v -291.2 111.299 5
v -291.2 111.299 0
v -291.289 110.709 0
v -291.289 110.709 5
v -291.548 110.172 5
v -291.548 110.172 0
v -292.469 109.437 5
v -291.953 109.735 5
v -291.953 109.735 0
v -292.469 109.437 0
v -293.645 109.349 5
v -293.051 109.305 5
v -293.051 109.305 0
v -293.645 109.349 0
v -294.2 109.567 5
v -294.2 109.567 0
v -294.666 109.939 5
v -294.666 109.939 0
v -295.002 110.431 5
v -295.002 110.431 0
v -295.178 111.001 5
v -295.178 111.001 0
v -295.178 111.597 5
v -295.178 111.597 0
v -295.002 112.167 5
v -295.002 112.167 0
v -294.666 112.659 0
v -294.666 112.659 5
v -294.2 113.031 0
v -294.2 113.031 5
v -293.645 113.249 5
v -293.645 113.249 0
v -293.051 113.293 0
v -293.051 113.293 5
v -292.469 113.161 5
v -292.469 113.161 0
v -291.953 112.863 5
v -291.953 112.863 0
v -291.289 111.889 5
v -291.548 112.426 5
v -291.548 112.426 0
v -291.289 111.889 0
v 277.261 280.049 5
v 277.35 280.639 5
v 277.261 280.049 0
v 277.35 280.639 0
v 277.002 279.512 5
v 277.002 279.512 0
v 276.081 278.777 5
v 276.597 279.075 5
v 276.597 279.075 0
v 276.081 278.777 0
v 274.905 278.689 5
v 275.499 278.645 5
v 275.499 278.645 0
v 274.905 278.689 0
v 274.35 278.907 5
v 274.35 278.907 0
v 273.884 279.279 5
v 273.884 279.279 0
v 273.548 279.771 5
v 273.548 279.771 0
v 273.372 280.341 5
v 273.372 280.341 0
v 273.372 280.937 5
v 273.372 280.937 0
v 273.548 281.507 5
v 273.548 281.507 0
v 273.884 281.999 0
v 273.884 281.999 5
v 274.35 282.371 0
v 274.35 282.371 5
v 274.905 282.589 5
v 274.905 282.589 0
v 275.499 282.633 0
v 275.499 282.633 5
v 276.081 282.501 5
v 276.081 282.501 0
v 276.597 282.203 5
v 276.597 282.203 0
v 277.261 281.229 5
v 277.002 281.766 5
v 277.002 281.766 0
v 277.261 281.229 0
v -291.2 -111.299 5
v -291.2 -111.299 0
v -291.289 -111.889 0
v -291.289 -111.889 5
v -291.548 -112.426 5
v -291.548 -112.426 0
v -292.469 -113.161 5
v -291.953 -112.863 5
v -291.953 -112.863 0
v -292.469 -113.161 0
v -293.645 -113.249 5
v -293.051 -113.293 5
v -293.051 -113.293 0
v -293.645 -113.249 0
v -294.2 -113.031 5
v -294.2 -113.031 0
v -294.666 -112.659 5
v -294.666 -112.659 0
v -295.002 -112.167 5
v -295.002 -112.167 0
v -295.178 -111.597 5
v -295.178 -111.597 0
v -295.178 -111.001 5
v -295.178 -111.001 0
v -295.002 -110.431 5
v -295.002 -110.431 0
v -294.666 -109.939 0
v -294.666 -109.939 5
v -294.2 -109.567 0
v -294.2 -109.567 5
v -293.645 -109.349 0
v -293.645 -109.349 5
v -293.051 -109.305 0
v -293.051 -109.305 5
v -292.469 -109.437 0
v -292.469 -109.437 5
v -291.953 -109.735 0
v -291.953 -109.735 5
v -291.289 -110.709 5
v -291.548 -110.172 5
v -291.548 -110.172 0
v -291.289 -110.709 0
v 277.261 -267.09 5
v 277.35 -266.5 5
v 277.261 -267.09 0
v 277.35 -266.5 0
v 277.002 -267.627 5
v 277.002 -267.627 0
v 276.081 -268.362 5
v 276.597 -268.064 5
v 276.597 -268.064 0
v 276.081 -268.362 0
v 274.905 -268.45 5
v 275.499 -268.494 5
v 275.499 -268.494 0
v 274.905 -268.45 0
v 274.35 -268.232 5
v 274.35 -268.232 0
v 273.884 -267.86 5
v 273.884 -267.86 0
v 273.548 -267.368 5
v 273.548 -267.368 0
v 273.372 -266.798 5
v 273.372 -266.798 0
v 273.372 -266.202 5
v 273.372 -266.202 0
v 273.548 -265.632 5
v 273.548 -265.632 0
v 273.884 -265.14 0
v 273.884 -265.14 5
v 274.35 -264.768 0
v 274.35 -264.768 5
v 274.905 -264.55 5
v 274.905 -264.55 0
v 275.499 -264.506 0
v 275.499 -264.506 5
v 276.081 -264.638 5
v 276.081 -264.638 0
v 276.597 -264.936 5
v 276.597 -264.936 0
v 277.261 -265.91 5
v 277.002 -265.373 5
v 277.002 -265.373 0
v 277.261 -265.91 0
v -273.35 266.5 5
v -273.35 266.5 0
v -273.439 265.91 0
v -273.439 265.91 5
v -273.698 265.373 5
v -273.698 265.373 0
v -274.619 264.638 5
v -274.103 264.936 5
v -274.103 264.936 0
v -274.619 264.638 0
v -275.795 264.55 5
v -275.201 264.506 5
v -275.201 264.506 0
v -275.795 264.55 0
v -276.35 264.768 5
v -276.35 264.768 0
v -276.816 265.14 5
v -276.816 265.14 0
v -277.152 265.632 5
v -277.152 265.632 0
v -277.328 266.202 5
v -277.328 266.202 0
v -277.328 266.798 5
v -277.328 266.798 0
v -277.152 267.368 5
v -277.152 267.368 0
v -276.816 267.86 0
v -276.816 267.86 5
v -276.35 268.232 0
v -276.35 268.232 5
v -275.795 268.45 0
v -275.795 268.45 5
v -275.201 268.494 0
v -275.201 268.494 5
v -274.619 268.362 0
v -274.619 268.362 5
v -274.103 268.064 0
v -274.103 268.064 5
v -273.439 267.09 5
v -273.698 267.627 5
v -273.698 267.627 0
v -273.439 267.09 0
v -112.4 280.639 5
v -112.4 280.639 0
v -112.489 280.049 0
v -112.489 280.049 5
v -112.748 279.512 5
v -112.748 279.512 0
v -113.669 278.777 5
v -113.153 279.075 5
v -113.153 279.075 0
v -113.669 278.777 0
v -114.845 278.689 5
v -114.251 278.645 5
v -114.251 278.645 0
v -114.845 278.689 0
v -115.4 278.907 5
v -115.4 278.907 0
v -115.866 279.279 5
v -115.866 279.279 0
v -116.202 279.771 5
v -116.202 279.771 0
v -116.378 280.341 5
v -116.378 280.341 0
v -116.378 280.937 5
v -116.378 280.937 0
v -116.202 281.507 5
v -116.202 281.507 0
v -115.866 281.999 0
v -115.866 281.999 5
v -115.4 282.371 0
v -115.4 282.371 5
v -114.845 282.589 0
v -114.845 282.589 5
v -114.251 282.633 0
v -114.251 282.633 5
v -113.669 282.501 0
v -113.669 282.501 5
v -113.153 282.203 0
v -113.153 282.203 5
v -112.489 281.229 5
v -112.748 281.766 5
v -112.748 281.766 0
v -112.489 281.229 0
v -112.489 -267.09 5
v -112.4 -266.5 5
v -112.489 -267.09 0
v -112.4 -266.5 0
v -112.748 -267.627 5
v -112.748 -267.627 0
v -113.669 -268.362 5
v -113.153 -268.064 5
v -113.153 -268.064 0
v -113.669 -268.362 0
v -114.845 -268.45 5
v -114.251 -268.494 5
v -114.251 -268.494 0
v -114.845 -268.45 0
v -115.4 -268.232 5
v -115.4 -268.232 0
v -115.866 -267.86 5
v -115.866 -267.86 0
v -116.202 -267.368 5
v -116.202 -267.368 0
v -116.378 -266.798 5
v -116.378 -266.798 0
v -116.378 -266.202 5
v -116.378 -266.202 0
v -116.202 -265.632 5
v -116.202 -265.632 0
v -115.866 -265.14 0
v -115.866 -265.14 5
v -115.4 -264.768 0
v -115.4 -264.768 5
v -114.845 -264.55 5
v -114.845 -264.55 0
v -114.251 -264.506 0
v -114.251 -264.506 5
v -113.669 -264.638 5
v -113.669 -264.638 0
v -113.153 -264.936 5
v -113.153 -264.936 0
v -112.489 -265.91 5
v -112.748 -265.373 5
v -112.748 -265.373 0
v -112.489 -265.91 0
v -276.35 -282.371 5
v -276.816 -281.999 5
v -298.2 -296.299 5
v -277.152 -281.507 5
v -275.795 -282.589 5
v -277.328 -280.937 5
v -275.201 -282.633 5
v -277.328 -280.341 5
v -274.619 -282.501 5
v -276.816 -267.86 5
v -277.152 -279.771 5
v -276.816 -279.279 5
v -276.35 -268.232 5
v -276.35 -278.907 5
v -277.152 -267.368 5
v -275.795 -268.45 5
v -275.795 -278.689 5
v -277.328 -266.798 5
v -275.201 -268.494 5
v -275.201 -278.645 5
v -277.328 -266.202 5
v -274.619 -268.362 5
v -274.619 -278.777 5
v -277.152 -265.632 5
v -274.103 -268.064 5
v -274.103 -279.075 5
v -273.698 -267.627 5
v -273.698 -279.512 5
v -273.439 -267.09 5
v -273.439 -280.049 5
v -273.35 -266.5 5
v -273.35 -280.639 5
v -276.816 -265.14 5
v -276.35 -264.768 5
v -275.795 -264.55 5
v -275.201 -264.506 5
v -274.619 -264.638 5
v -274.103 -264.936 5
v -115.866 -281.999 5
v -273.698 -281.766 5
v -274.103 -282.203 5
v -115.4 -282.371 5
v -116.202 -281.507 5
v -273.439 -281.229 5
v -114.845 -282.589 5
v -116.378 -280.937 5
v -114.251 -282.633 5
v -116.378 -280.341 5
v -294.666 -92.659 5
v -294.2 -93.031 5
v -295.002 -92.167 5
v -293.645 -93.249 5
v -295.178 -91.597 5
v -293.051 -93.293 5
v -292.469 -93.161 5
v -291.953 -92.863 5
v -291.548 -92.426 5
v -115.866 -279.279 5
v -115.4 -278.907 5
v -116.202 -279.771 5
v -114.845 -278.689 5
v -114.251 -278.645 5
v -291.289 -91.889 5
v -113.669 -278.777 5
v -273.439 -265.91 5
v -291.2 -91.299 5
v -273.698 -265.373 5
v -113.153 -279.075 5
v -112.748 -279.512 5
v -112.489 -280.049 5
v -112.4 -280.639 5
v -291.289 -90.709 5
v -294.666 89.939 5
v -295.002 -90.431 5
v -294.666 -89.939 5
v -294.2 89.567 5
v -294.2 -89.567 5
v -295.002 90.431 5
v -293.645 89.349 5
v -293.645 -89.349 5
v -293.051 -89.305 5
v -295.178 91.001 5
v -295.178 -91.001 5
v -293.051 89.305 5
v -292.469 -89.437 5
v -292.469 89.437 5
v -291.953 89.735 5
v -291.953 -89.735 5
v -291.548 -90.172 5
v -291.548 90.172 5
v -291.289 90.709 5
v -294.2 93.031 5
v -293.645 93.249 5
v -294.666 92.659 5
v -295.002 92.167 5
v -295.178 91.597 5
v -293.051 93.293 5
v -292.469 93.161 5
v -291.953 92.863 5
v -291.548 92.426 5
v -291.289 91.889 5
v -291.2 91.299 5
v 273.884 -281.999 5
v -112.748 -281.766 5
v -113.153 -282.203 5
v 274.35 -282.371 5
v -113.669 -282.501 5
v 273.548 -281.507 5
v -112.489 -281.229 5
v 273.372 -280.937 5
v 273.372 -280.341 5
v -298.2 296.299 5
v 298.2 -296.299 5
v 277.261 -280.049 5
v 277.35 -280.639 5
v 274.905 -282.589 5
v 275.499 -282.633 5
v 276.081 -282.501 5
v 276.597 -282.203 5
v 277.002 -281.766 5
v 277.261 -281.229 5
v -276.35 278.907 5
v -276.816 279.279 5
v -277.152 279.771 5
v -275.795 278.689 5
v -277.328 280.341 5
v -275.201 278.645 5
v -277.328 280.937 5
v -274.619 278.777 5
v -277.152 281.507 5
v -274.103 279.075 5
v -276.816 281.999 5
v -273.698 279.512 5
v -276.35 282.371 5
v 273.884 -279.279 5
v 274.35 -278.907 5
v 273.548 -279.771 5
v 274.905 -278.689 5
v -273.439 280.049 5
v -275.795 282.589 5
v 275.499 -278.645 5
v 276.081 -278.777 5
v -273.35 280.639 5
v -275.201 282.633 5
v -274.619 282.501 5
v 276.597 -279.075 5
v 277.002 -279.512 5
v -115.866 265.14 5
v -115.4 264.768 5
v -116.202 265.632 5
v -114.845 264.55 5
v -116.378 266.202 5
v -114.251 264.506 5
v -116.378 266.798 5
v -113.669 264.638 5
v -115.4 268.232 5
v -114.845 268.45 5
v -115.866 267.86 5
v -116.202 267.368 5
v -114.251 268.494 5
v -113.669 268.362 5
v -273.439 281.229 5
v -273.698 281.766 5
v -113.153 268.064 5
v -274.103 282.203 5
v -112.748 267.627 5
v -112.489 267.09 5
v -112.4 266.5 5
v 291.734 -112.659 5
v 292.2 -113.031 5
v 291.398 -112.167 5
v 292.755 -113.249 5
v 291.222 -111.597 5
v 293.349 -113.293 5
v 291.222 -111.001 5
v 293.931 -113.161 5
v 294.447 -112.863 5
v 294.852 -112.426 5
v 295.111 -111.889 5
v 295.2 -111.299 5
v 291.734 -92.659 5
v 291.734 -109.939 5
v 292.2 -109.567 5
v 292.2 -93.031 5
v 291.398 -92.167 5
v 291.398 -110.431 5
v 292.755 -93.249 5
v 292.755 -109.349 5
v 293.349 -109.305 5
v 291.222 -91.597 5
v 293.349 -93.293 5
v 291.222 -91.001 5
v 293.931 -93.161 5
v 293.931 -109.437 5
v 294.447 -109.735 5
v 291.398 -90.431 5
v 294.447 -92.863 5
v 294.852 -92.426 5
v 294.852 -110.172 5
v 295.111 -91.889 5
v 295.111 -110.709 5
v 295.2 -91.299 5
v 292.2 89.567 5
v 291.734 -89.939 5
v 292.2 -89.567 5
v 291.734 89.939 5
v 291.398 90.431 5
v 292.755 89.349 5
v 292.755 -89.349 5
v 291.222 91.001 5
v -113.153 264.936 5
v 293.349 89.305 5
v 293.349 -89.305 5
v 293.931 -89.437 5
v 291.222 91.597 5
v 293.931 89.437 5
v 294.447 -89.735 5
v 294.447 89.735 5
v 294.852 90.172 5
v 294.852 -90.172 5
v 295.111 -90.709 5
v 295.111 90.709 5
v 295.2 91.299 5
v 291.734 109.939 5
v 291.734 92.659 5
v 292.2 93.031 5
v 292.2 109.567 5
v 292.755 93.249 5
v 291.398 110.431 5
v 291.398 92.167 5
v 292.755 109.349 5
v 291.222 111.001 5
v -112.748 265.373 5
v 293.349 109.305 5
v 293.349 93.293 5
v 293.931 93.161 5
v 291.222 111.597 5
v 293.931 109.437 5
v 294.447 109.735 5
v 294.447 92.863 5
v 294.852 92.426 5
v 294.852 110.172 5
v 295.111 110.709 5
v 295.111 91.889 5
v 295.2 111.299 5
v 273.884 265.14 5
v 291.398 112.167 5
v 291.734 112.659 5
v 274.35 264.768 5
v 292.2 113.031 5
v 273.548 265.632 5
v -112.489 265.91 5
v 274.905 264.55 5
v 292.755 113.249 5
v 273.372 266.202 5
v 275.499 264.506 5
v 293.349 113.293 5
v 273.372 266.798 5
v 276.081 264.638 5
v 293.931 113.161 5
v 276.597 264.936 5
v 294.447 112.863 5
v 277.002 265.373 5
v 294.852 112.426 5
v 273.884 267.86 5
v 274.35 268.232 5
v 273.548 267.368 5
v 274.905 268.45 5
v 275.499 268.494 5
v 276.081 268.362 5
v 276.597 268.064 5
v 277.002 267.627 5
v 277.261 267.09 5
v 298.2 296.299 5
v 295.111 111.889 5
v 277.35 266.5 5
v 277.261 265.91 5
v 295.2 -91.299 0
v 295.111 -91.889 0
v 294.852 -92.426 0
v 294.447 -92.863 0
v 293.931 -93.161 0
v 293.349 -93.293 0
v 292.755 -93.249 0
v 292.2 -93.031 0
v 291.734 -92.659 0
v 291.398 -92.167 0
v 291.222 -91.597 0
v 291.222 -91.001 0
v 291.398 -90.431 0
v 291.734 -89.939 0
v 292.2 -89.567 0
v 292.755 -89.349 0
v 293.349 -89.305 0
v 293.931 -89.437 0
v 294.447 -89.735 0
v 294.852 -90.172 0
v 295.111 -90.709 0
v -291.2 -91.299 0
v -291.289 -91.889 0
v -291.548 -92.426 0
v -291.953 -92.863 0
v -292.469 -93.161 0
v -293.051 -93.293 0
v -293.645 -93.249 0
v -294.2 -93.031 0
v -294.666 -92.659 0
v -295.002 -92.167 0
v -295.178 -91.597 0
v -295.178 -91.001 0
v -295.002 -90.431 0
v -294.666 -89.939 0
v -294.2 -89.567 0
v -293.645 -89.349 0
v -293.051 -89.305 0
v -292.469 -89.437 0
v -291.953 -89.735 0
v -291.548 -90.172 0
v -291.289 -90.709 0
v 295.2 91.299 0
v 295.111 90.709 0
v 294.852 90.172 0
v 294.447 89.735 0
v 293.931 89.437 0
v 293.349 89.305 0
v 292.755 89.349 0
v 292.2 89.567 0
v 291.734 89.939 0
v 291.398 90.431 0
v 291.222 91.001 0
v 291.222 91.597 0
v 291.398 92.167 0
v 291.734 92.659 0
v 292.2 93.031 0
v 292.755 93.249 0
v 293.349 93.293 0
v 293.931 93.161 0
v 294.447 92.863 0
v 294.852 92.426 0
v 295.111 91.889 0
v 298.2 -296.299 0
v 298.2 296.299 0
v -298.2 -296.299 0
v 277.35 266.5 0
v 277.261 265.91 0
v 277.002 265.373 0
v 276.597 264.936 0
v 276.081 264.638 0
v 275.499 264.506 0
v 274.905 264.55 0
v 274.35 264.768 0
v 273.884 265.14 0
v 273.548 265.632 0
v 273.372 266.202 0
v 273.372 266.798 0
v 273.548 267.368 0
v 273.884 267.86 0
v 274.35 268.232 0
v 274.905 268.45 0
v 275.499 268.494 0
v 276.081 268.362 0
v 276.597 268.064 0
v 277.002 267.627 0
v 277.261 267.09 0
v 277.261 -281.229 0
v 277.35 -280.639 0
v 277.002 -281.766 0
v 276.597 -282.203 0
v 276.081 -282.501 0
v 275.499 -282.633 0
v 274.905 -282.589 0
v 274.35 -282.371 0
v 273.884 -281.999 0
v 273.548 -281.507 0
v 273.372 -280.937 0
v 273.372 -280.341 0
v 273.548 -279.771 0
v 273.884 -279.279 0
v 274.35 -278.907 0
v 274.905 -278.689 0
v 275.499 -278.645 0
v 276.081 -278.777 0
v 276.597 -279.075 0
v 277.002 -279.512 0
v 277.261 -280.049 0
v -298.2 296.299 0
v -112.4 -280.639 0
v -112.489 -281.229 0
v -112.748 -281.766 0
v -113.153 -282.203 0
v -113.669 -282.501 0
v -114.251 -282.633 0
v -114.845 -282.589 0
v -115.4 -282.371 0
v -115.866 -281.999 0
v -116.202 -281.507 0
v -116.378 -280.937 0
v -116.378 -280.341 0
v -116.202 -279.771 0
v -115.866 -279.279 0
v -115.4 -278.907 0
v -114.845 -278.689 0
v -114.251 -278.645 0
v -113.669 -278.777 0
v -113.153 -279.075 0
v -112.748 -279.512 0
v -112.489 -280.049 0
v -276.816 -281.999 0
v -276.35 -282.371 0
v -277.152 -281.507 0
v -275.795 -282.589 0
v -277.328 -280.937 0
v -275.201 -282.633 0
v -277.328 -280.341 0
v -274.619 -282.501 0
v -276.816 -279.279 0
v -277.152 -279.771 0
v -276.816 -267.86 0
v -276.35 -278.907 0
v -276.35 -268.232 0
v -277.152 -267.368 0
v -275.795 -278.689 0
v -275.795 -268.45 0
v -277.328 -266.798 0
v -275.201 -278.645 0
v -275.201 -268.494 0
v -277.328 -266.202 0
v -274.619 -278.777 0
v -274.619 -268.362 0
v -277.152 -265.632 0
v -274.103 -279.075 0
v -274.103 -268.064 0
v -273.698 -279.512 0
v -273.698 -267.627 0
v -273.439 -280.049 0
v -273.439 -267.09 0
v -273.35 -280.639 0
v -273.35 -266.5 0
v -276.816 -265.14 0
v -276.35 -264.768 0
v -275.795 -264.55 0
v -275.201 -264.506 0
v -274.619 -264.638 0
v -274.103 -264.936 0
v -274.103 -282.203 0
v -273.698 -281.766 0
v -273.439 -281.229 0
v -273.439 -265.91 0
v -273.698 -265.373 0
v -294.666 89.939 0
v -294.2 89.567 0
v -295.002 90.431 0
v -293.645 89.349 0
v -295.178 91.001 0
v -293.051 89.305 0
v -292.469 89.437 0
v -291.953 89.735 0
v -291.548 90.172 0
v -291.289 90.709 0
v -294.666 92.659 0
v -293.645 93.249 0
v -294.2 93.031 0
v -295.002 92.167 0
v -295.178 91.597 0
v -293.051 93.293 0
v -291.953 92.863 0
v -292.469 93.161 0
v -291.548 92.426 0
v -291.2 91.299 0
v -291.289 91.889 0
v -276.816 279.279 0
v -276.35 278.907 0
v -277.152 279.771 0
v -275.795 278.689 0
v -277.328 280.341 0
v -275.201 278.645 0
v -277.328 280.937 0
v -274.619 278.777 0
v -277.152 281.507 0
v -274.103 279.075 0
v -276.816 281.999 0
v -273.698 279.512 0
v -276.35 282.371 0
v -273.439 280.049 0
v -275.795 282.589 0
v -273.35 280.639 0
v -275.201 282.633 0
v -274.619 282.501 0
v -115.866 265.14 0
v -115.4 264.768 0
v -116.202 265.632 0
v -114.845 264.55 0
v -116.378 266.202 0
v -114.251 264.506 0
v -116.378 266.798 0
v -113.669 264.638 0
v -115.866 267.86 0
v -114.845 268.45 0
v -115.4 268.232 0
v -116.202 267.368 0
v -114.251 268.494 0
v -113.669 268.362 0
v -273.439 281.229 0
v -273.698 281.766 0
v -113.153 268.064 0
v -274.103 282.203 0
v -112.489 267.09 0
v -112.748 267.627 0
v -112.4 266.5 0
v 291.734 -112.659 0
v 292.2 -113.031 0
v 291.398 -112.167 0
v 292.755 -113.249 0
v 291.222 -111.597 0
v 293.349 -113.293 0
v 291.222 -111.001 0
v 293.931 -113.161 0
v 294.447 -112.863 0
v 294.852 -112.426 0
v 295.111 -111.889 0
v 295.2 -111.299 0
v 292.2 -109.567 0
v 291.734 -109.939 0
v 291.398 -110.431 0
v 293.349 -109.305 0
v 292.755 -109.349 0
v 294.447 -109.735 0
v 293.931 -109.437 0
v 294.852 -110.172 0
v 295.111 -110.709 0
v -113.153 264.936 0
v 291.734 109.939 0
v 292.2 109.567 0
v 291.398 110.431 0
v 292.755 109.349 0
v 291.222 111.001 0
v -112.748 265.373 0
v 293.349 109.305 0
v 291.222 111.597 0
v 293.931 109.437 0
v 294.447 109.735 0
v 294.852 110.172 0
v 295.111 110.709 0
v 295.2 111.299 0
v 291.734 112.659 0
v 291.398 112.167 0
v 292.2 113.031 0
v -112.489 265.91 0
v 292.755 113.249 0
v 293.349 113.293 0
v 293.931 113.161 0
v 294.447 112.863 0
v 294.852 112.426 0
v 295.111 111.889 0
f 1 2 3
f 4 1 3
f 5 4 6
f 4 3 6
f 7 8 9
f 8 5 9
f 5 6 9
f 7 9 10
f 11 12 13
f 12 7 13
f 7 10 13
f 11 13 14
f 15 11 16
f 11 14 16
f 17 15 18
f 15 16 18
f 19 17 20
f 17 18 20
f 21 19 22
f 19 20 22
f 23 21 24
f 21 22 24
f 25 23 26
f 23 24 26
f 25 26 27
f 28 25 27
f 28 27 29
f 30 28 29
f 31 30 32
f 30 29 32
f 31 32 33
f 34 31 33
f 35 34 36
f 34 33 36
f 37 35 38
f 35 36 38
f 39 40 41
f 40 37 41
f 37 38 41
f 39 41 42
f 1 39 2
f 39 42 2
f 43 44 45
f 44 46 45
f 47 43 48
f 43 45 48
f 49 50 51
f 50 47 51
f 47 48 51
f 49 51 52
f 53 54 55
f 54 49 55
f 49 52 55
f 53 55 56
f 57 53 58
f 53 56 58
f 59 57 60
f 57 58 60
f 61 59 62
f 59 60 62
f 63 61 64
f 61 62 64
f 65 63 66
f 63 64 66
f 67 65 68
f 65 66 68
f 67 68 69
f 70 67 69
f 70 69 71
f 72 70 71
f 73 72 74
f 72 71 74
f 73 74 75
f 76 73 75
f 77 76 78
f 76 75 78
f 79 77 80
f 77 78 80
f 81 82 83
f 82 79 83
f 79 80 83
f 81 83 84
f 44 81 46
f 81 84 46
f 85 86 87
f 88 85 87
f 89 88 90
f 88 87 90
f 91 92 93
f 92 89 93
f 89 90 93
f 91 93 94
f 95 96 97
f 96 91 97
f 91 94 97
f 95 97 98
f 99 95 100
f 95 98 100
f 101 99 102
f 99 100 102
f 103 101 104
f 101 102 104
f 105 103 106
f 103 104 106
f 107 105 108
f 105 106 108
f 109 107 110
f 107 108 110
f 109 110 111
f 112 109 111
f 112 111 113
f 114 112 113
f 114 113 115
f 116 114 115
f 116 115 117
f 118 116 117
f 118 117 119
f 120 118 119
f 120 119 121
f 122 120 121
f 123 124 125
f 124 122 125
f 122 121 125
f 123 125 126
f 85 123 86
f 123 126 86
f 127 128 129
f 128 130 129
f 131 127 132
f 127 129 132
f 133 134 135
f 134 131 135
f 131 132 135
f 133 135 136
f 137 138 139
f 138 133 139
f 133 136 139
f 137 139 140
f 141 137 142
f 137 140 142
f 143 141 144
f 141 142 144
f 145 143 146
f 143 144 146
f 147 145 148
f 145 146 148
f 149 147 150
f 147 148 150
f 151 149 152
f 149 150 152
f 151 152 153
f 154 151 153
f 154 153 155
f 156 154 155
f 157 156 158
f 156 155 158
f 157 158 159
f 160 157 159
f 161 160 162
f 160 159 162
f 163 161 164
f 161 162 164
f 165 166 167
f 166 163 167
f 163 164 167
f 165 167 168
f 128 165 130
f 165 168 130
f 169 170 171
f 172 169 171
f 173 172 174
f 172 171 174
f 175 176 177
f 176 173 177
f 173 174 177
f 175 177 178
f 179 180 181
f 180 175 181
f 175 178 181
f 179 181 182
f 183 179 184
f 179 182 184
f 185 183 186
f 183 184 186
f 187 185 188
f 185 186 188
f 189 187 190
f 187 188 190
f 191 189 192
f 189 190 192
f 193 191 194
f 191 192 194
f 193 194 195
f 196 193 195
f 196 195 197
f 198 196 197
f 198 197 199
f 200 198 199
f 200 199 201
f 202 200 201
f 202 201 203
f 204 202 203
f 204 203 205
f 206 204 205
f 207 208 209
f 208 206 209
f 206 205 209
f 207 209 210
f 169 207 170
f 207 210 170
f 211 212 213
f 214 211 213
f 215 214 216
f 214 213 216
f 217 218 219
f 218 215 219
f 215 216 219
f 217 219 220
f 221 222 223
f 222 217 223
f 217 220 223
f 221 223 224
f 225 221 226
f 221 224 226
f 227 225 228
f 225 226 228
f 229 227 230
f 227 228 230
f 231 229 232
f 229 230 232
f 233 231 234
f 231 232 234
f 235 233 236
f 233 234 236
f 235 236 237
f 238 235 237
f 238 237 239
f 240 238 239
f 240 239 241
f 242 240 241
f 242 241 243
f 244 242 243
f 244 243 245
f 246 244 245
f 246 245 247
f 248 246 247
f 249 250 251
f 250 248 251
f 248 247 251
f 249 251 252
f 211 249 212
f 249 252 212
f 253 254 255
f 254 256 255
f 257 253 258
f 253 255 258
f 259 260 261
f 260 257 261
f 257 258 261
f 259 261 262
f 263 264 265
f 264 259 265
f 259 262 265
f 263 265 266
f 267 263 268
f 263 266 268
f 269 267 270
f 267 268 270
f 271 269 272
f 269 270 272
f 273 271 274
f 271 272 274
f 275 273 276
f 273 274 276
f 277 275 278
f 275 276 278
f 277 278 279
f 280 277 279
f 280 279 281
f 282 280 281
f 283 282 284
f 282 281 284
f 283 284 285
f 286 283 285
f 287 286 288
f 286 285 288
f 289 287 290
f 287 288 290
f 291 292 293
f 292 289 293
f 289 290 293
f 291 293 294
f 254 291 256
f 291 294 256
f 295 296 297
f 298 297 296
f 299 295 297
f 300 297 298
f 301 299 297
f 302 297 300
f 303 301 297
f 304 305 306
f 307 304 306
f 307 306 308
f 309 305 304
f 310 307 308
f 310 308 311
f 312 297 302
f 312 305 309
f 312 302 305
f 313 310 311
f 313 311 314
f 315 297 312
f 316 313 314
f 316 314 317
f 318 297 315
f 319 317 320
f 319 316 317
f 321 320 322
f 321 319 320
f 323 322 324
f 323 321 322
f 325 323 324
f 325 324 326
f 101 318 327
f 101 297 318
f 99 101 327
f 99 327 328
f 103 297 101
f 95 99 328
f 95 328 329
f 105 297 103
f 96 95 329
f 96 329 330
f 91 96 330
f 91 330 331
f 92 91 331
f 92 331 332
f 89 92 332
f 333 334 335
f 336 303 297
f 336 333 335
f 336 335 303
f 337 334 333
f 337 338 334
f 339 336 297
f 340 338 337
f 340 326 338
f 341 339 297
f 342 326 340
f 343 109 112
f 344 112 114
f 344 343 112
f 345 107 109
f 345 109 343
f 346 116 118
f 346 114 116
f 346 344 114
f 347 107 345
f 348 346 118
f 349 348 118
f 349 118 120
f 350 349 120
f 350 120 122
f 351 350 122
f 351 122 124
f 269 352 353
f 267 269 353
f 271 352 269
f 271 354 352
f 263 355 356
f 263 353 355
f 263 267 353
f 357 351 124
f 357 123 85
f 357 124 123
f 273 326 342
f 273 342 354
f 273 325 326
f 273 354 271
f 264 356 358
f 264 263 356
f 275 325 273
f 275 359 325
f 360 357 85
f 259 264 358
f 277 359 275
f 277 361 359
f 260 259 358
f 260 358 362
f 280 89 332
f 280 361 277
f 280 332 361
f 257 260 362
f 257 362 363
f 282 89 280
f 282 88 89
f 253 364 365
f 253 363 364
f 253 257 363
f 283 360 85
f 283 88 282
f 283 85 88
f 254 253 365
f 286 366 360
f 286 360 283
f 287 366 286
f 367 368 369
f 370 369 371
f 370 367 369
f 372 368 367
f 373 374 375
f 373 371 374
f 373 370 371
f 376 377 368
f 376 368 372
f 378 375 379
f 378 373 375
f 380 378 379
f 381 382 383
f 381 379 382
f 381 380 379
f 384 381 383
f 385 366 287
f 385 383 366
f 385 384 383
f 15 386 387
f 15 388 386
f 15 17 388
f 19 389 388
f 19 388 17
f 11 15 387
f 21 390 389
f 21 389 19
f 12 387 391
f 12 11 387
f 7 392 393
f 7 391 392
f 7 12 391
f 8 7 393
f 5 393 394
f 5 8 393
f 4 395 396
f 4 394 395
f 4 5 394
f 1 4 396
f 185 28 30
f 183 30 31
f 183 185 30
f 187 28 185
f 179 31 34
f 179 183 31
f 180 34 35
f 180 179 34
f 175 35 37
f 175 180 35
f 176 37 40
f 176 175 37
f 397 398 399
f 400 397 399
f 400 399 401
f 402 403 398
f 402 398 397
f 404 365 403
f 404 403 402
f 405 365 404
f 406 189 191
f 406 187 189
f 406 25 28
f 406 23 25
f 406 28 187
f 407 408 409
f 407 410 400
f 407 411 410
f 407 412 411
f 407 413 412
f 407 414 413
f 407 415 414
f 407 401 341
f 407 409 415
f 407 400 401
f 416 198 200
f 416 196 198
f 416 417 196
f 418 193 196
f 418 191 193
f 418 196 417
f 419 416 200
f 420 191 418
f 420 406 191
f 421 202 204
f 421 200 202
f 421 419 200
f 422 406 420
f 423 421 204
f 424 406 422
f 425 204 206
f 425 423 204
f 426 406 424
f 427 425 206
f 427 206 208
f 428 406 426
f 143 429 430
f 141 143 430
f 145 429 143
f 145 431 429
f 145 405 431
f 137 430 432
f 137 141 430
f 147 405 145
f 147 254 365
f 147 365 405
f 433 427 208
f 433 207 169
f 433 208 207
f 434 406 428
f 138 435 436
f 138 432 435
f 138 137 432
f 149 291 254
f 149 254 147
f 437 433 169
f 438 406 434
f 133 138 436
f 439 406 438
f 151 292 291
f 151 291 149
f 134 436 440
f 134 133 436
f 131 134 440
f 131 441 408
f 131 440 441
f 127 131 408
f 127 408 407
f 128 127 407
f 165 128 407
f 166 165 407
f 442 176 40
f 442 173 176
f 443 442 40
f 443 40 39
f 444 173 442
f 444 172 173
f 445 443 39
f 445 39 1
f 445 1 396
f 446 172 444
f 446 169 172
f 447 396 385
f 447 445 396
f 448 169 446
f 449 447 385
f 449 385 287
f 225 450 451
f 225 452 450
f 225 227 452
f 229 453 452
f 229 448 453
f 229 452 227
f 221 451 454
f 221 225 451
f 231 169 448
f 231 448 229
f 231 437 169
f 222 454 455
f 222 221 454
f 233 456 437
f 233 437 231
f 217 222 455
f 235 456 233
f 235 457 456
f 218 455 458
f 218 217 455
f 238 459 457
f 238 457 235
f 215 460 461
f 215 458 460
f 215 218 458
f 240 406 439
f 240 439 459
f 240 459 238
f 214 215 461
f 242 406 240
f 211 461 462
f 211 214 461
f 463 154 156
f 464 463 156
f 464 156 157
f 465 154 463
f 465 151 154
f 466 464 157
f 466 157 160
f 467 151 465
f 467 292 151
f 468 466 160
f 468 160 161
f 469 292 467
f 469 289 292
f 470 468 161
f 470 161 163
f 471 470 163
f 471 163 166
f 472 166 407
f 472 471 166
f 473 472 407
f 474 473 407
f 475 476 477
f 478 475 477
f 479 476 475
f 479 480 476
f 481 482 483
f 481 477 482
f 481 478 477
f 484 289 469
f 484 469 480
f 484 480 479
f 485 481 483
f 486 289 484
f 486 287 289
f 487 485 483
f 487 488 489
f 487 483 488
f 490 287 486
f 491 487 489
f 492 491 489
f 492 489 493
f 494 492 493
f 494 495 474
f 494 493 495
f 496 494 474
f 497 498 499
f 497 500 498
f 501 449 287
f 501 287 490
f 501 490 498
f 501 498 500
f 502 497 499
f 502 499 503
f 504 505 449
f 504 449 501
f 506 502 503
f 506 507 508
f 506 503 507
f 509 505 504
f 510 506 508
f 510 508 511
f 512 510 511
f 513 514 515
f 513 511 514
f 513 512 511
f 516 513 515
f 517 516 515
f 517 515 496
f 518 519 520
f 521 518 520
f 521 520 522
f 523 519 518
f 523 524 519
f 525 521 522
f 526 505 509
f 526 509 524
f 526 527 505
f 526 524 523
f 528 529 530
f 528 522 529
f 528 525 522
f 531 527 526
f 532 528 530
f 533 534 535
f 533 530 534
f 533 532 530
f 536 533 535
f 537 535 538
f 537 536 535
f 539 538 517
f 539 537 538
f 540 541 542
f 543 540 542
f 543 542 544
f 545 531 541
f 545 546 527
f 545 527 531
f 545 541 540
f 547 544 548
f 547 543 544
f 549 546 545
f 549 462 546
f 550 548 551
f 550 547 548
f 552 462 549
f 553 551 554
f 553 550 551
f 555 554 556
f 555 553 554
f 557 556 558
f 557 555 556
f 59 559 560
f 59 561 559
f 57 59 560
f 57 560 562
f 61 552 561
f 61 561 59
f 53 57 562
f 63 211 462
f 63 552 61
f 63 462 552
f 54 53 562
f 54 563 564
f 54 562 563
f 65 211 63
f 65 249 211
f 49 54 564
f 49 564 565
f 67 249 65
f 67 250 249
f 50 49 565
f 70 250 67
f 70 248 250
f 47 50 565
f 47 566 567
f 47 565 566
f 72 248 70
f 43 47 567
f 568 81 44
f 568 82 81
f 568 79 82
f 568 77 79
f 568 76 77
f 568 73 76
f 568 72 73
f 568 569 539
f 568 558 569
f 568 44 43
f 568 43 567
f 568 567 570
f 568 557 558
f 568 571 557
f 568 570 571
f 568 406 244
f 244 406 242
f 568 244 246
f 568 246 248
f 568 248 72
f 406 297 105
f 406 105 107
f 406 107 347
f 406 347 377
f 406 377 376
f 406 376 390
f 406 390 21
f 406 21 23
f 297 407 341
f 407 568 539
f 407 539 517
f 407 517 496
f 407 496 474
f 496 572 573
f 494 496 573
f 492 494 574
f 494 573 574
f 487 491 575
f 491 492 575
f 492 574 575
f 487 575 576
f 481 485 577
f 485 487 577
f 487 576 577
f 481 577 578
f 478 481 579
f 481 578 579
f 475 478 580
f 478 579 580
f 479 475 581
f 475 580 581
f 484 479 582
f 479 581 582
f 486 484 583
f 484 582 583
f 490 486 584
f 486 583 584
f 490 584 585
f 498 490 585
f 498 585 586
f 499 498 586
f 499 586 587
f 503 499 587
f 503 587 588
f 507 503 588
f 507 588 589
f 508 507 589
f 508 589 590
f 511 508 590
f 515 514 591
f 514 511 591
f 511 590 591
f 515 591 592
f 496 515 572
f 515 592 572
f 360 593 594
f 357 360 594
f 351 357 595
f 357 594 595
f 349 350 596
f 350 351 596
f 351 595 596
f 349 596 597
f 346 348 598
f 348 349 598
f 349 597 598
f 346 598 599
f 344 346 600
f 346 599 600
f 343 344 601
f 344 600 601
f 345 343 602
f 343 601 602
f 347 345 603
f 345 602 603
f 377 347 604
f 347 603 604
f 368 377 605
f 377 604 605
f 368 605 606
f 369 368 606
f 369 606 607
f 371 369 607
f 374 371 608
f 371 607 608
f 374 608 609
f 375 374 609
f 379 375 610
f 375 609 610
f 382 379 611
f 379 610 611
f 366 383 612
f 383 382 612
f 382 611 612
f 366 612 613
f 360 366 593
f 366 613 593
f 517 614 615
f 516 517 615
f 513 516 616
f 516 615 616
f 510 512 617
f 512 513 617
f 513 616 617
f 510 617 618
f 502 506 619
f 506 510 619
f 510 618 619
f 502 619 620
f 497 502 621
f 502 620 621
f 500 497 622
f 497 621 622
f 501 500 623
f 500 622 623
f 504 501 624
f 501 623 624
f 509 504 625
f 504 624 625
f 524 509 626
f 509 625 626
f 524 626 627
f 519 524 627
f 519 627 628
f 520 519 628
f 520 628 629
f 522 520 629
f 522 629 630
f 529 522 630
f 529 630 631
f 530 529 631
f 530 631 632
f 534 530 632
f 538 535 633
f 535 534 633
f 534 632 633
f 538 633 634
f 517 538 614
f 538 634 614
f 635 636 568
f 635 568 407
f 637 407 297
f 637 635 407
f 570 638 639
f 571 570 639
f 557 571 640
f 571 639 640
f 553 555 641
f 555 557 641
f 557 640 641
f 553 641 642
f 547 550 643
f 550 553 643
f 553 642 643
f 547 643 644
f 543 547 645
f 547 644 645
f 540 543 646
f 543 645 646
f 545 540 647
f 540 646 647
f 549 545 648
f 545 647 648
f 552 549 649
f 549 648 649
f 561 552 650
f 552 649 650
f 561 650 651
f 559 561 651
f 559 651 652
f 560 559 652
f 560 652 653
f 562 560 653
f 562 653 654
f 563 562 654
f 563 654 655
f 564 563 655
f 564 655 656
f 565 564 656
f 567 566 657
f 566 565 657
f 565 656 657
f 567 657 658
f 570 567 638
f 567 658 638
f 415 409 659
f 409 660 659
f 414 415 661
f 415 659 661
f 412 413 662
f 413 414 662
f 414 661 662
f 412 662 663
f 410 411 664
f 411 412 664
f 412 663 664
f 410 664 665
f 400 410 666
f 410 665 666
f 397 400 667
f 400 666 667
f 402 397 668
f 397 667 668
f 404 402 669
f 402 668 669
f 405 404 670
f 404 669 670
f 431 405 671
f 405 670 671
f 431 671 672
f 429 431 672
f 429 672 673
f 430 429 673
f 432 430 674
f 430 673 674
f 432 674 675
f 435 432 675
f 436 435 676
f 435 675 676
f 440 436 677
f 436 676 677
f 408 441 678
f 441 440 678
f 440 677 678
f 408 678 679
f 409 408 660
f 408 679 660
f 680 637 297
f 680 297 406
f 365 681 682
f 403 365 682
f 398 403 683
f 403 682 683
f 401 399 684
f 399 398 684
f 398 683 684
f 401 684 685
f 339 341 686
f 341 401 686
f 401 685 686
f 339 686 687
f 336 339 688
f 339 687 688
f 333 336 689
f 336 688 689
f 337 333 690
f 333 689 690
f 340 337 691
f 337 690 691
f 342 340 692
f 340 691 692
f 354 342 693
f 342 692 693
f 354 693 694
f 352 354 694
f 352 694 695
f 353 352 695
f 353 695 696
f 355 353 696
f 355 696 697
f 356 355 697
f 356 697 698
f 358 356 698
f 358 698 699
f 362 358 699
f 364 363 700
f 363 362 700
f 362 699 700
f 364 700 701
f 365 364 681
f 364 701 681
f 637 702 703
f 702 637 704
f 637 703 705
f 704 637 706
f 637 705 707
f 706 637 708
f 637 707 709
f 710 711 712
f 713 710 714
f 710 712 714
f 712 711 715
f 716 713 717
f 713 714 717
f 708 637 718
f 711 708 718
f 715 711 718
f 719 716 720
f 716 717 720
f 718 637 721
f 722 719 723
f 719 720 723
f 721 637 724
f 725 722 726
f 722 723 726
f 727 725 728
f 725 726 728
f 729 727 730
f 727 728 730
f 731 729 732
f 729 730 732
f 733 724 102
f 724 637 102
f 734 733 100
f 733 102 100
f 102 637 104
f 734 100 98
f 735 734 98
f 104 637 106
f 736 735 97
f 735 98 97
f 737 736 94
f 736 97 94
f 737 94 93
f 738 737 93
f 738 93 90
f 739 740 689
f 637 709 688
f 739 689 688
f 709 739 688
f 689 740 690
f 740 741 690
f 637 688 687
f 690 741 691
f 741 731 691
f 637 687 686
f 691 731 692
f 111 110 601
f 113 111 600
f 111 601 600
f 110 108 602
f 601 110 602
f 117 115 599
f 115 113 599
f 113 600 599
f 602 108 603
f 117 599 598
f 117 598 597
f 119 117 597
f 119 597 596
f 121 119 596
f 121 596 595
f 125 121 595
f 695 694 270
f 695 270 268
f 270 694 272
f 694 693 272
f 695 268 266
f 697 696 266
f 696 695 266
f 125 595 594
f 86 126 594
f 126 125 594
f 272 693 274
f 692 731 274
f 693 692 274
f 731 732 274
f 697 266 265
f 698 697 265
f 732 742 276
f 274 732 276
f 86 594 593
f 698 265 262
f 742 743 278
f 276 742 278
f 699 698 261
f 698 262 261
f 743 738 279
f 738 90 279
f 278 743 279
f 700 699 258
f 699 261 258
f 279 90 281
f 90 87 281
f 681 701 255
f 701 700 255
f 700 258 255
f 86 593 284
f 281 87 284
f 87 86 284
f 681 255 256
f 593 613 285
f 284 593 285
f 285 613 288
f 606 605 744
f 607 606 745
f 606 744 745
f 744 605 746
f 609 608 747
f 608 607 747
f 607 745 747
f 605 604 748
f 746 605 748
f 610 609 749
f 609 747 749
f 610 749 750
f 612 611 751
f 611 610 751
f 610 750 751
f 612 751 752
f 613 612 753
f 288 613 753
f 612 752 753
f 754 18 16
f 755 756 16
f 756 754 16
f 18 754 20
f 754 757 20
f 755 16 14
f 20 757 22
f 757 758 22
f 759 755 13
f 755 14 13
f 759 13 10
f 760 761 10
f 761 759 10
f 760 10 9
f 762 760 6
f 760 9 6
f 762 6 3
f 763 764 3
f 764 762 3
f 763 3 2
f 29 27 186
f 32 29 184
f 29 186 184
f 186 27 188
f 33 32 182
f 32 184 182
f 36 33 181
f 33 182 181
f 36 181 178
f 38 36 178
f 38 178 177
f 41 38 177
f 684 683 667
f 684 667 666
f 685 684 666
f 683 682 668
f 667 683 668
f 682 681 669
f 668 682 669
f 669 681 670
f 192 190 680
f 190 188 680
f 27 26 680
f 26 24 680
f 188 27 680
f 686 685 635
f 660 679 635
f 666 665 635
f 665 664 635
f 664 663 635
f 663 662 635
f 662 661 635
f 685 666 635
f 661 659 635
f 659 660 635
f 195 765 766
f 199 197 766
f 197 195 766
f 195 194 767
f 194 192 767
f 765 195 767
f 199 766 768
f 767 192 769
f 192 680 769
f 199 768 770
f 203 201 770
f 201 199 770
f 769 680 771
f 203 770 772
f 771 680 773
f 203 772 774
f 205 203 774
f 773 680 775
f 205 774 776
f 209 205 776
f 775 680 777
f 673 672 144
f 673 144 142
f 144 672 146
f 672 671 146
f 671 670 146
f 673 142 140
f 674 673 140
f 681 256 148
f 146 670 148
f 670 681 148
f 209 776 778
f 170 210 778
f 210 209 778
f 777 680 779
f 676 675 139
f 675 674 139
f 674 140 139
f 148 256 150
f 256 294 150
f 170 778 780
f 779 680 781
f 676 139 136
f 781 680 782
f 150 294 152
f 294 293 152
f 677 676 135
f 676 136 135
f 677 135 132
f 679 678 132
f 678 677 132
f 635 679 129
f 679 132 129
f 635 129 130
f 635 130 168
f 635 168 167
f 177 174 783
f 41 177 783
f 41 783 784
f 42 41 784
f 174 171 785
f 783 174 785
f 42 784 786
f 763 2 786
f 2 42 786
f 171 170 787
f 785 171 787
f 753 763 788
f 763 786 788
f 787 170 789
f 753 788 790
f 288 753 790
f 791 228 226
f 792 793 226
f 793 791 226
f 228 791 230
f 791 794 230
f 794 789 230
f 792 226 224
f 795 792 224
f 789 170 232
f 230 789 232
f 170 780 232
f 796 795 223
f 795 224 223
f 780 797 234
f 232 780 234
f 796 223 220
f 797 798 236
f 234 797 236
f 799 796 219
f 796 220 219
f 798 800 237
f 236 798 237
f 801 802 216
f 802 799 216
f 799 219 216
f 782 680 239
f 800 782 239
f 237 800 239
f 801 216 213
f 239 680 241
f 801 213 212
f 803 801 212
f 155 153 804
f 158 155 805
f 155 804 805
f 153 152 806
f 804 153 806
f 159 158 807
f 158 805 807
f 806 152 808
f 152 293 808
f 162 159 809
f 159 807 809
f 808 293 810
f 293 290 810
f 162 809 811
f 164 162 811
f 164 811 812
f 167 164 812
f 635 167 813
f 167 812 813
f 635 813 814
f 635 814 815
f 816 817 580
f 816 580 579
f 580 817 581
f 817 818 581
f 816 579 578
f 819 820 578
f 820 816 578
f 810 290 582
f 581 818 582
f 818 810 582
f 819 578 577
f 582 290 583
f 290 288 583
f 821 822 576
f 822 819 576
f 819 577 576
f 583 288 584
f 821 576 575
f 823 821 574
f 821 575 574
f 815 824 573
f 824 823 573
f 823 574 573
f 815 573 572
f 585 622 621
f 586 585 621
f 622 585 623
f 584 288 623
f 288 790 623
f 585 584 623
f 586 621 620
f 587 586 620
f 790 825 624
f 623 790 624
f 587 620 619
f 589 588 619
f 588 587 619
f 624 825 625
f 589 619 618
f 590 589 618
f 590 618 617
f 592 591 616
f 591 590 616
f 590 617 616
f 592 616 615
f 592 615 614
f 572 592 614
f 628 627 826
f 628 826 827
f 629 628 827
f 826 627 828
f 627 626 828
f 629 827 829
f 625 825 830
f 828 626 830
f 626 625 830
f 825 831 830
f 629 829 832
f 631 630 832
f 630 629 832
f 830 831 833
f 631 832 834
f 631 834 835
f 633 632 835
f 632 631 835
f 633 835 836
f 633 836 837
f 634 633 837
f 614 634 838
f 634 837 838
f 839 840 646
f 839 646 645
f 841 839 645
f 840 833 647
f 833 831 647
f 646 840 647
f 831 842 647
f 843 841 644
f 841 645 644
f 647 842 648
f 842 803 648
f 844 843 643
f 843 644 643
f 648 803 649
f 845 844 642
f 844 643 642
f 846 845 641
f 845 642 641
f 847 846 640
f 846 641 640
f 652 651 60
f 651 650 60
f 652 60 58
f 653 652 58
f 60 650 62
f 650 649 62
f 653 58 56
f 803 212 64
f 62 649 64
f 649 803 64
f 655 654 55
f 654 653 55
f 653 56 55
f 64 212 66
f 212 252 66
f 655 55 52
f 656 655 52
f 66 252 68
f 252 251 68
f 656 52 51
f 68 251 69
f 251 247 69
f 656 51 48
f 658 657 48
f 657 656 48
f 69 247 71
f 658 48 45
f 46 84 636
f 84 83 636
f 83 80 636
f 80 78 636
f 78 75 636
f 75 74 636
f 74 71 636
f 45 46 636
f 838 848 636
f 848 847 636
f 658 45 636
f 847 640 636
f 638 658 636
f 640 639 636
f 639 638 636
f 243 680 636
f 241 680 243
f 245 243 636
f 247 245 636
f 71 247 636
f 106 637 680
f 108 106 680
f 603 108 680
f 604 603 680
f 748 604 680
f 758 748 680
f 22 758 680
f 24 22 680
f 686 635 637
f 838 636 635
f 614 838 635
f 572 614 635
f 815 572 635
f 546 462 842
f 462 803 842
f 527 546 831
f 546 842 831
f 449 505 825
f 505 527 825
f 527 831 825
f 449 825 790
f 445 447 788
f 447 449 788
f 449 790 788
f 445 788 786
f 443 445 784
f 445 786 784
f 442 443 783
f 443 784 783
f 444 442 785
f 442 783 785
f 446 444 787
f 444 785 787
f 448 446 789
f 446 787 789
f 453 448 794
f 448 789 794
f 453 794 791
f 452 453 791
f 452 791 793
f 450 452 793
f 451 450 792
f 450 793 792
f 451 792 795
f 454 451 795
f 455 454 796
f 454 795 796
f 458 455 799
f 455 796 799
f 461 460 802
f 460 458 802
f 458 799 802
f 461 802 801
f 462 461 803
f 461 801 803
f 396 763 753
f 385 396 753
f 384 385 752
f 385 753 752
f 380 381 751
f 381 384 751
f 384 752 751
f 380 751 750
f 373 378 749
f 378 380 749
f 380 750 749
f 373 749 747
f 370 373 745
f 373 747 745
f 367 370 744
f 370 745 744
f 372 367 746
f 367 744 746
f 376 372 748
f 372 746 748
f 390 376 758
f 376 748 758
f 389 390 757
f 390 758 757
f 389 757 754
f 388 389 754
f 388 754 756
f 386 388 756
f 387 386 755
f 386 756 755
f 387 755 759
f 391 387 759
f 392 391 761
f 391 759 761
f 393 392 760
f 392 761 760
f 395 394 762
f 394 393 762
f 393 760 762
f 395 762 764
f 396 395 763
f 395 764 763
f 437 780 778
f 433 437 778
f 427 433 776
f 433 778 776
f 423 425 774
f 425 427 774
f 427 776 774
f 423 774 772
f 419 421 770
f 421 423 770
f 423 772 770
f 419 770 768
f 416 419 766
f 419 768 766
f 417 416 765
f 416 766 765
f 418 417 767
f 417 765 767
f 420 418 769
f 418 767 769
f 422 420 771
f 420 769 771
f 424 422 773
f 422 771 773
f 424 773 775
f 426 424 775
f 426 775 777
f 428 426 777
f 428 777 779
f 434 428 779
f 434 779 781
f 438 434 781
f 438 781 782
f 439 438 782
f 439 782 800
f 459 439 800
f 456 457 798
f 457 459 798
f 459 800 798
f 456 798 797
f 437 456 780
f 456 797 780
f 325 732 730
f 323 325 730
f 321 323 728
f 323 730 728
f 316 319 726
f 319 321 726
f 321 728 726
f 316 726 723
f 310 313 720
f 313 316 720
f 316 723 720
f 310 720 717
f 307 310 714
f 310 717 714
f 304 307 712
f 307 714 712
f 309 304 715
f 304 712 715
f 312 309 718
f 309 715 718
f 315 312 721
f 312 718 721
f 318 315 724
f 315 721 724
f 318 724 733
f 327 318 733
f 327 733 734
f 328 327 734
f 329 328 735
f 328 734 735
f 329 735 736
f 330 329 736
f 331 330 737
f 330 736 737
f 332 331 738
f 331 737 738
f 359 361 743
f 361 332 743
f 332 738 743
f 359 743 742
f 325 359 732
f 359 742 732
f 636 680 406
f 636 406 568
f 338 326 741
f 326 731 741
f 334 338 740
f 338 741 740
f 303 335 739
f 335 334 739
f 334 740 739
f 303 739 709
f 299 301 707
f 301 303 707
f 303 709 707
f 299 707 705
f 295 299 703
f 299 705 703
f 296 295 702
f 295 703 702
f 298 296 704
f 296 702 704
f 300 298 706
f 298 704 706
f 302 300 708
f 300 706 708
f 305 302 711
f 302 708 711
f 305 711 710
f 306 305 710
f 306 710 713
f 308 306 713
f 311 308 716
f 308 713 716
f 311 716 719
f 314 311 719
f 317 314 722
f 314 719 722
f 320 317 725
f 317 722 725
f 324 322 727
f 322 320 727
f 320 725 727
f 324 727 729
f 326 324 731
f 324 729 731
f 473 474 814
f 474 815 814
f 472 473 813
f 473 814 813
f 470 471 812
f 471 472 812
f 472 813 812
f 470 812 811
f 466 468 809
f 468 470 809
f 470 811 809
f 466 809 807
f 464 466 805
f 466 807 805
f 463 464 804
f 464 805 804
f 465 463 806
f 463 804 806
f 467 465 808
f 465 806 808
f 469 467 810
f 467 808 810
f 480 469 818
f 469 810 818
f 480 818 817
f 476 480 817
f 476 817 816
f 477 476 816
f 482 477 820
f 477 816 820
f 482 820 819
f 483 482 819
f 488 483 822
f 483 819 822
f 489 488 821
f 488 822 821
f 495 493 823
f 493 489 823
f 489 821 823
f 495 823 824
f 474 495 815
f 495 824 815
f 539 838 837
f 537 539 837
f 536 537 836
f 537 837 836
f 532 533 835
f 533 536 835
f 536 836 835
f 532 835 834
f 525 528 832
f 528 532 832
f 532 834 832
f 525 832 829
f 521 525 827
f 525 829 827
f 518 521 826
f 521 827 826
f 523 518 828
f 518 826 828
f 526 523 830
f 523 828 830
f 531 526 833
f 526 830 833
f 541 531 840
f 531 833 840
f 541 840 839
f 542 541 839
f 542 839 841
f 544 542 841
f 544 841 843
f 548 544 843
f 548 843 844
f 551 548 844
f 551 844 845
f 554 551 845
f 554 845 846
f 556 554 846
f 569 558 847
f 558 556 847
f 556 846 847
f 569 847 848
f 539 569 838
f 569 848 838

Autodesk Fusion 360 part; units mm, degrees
sketch "Sketch1" plane through (0, 0, 0) normal (0, 0, 1) x (1, 0, 0)
  line L0 (298.2, -291.299) -> (-298.2, -291.299)
  line L1 (-298.2, -291.299) -> (-298.2, 291.299)
  line L2 (-298.2, 291.299) -> (298.2, 291.299)
  line L3 (298.2, 291.299) -> (298.2, -291.299)
  line L4 (298.2, -291.299) -> (-298.2, 291.299) construction
  line L5 (-298.2, -291.299) -> (298.2, 291.299) construction
  line L6 (-275.35, 291.299) -> (-275.35, -291.299) construction
  circle A0 centre (-275.35, 280.639) radius 2
  circle A1 centre (-275.35, 266.5) radius 2
  circle A2 centre (-275.35, -280.639) radius 2
  circle A3 centre (-275.35, -266.5) radius 2
  line L7 (275.35, 291.299) -> (275.35, -291.299) construction
  circle A4 centre (275.35, 280.639) radius 2
  circle A5 centre (275.35, 266.5) radius 2
  circle A6 centre (275.35, -280.639) radius 2
  circle A7 centre (275.35, -266.5) radius 2
  line L8 (-275.35, -266.5) -> (275.35, -266.5) construction
  circle A8 centre (-114.4, -266.5) radius 2
  line L9 (-114.4, -291.299) -> (-114.4, 278.639) construction
  circle A9 centre (-114.4, 266.5) radius 2
  circle A10 centre (-114.4, 280.639) radius 2
  circle A11 centre (-114.4, -280.639) radius 2
  line L10 (-298.2, 296.299) -> (298.2, 296.299)
  line L11 (298.2, 296.299) -> (298.2, -296.299)
  line L12 (298.2, -296.299) -> (-298.2, -296.299)
  line L13 (-298.2, -296.299) -> (-298.2, 296.299)
  line L14 (-298.2, 101.299) -> (298.2, 101.299) construction
  line L15 (-298.2, -101.299) -> (298.2, -101.299) construction
  circle A12 centre (293.2, -91.299) radius 2
  circle A13 centre (293.2, -111.299) radius 2
  circle A14 centre (293.2, 91.299) radius 2
  circle A15 centre (293.2, 111.299) radius 2
  circle A16 centre (-293.2, 111.299) radius 2
  circle A17 centre (-293.2, 91.299) radius 2
  circle A18 centre (-293.2, -91.299) radius 2
  circle A19 centre (-293.2, -111.299) radius 2
  line L16 (-275.35, 266.5) -> (275.35, 266.5) construction
  line L17 (-275.35, 280.639) -> (275.35, 280.639) construction
  line L18 (275.35, -280.639) -> (-275.35, -280.639) construction
  dimension "d1" = 596.4
  dimension "d2" = 582.598
  dimension "d3" = 22.85
  dimension "d4" = 4
  dimension "d6" = 4
  dimension "d8" = 4
  dimension "d9" = 4
  dimension "d12" = 22.85
  dimension "d13" = 4
  dimension "d14" = 4
  dimension "d17" = 4
  dimension "d18" = 4
  dimension "d21" = 4
  dimension "d22" = 4
  dimension "d23" = 4
  dimension "d24" = 4
  dimension "d29" = 5
  dimension "d31" = 5
  dimension "d38" = 190
  dimension "d39" = 190
  dimension "d40" = 4
  dimension "d41" = 4
  dimension "d42" = 10
  dimension "d43" = 10
  dimension "d44" = 5
  dimension "d45" = 5
  dimension "d46" = 4
  dimension "d47" = 4
  dimension "d48" = 10
  dimension "d49" = 10
  dimension "d50" = 5
  dimension "d51" = 5
  dimension "d52" = 4
  dimension "d53" = 4
  dimension "d54" = 5
  dimension "d55" = 5
  dimension "d56" = 10
  dimension "d57" = 10
  dimension "d58" = 4
  dimension "d59" = 4
  dimension "d60" = 5
  dimension "d61" = 5
  dimension "d62" = 10
  dimension "d63" = 10
  dimension "d70" = 24.799
  dimension "d71" = 10.66
  dimension "d72" = 10.66
  dimension "d73" = 24.799
  dimension "d74" = 412.6
extrude "Extrude1" add sketch "Sketch1" along normal blind 5 makes body 1
copy_body "Body->Comp1" bodies 1 removing the originals makes body 2 in component "Side"
component "Side" placed x (1, 0, 0) y (0, 1, 0) z (0, 0, 1) at (0, 0, 0)
equation "d1 = YRailLength + 246.4 mm"
equation "d2 = PrintHeight + 282.598 mm"
equation "d29 = WallThickness"
equation "d31 = WallThickness"
equation "WallThickness = 5 mm"
equation "YRailLength = 350 mm"
equation "PrintHeight = 300 mm"
equation "d74 = YRailLength + 62.6 mm"
